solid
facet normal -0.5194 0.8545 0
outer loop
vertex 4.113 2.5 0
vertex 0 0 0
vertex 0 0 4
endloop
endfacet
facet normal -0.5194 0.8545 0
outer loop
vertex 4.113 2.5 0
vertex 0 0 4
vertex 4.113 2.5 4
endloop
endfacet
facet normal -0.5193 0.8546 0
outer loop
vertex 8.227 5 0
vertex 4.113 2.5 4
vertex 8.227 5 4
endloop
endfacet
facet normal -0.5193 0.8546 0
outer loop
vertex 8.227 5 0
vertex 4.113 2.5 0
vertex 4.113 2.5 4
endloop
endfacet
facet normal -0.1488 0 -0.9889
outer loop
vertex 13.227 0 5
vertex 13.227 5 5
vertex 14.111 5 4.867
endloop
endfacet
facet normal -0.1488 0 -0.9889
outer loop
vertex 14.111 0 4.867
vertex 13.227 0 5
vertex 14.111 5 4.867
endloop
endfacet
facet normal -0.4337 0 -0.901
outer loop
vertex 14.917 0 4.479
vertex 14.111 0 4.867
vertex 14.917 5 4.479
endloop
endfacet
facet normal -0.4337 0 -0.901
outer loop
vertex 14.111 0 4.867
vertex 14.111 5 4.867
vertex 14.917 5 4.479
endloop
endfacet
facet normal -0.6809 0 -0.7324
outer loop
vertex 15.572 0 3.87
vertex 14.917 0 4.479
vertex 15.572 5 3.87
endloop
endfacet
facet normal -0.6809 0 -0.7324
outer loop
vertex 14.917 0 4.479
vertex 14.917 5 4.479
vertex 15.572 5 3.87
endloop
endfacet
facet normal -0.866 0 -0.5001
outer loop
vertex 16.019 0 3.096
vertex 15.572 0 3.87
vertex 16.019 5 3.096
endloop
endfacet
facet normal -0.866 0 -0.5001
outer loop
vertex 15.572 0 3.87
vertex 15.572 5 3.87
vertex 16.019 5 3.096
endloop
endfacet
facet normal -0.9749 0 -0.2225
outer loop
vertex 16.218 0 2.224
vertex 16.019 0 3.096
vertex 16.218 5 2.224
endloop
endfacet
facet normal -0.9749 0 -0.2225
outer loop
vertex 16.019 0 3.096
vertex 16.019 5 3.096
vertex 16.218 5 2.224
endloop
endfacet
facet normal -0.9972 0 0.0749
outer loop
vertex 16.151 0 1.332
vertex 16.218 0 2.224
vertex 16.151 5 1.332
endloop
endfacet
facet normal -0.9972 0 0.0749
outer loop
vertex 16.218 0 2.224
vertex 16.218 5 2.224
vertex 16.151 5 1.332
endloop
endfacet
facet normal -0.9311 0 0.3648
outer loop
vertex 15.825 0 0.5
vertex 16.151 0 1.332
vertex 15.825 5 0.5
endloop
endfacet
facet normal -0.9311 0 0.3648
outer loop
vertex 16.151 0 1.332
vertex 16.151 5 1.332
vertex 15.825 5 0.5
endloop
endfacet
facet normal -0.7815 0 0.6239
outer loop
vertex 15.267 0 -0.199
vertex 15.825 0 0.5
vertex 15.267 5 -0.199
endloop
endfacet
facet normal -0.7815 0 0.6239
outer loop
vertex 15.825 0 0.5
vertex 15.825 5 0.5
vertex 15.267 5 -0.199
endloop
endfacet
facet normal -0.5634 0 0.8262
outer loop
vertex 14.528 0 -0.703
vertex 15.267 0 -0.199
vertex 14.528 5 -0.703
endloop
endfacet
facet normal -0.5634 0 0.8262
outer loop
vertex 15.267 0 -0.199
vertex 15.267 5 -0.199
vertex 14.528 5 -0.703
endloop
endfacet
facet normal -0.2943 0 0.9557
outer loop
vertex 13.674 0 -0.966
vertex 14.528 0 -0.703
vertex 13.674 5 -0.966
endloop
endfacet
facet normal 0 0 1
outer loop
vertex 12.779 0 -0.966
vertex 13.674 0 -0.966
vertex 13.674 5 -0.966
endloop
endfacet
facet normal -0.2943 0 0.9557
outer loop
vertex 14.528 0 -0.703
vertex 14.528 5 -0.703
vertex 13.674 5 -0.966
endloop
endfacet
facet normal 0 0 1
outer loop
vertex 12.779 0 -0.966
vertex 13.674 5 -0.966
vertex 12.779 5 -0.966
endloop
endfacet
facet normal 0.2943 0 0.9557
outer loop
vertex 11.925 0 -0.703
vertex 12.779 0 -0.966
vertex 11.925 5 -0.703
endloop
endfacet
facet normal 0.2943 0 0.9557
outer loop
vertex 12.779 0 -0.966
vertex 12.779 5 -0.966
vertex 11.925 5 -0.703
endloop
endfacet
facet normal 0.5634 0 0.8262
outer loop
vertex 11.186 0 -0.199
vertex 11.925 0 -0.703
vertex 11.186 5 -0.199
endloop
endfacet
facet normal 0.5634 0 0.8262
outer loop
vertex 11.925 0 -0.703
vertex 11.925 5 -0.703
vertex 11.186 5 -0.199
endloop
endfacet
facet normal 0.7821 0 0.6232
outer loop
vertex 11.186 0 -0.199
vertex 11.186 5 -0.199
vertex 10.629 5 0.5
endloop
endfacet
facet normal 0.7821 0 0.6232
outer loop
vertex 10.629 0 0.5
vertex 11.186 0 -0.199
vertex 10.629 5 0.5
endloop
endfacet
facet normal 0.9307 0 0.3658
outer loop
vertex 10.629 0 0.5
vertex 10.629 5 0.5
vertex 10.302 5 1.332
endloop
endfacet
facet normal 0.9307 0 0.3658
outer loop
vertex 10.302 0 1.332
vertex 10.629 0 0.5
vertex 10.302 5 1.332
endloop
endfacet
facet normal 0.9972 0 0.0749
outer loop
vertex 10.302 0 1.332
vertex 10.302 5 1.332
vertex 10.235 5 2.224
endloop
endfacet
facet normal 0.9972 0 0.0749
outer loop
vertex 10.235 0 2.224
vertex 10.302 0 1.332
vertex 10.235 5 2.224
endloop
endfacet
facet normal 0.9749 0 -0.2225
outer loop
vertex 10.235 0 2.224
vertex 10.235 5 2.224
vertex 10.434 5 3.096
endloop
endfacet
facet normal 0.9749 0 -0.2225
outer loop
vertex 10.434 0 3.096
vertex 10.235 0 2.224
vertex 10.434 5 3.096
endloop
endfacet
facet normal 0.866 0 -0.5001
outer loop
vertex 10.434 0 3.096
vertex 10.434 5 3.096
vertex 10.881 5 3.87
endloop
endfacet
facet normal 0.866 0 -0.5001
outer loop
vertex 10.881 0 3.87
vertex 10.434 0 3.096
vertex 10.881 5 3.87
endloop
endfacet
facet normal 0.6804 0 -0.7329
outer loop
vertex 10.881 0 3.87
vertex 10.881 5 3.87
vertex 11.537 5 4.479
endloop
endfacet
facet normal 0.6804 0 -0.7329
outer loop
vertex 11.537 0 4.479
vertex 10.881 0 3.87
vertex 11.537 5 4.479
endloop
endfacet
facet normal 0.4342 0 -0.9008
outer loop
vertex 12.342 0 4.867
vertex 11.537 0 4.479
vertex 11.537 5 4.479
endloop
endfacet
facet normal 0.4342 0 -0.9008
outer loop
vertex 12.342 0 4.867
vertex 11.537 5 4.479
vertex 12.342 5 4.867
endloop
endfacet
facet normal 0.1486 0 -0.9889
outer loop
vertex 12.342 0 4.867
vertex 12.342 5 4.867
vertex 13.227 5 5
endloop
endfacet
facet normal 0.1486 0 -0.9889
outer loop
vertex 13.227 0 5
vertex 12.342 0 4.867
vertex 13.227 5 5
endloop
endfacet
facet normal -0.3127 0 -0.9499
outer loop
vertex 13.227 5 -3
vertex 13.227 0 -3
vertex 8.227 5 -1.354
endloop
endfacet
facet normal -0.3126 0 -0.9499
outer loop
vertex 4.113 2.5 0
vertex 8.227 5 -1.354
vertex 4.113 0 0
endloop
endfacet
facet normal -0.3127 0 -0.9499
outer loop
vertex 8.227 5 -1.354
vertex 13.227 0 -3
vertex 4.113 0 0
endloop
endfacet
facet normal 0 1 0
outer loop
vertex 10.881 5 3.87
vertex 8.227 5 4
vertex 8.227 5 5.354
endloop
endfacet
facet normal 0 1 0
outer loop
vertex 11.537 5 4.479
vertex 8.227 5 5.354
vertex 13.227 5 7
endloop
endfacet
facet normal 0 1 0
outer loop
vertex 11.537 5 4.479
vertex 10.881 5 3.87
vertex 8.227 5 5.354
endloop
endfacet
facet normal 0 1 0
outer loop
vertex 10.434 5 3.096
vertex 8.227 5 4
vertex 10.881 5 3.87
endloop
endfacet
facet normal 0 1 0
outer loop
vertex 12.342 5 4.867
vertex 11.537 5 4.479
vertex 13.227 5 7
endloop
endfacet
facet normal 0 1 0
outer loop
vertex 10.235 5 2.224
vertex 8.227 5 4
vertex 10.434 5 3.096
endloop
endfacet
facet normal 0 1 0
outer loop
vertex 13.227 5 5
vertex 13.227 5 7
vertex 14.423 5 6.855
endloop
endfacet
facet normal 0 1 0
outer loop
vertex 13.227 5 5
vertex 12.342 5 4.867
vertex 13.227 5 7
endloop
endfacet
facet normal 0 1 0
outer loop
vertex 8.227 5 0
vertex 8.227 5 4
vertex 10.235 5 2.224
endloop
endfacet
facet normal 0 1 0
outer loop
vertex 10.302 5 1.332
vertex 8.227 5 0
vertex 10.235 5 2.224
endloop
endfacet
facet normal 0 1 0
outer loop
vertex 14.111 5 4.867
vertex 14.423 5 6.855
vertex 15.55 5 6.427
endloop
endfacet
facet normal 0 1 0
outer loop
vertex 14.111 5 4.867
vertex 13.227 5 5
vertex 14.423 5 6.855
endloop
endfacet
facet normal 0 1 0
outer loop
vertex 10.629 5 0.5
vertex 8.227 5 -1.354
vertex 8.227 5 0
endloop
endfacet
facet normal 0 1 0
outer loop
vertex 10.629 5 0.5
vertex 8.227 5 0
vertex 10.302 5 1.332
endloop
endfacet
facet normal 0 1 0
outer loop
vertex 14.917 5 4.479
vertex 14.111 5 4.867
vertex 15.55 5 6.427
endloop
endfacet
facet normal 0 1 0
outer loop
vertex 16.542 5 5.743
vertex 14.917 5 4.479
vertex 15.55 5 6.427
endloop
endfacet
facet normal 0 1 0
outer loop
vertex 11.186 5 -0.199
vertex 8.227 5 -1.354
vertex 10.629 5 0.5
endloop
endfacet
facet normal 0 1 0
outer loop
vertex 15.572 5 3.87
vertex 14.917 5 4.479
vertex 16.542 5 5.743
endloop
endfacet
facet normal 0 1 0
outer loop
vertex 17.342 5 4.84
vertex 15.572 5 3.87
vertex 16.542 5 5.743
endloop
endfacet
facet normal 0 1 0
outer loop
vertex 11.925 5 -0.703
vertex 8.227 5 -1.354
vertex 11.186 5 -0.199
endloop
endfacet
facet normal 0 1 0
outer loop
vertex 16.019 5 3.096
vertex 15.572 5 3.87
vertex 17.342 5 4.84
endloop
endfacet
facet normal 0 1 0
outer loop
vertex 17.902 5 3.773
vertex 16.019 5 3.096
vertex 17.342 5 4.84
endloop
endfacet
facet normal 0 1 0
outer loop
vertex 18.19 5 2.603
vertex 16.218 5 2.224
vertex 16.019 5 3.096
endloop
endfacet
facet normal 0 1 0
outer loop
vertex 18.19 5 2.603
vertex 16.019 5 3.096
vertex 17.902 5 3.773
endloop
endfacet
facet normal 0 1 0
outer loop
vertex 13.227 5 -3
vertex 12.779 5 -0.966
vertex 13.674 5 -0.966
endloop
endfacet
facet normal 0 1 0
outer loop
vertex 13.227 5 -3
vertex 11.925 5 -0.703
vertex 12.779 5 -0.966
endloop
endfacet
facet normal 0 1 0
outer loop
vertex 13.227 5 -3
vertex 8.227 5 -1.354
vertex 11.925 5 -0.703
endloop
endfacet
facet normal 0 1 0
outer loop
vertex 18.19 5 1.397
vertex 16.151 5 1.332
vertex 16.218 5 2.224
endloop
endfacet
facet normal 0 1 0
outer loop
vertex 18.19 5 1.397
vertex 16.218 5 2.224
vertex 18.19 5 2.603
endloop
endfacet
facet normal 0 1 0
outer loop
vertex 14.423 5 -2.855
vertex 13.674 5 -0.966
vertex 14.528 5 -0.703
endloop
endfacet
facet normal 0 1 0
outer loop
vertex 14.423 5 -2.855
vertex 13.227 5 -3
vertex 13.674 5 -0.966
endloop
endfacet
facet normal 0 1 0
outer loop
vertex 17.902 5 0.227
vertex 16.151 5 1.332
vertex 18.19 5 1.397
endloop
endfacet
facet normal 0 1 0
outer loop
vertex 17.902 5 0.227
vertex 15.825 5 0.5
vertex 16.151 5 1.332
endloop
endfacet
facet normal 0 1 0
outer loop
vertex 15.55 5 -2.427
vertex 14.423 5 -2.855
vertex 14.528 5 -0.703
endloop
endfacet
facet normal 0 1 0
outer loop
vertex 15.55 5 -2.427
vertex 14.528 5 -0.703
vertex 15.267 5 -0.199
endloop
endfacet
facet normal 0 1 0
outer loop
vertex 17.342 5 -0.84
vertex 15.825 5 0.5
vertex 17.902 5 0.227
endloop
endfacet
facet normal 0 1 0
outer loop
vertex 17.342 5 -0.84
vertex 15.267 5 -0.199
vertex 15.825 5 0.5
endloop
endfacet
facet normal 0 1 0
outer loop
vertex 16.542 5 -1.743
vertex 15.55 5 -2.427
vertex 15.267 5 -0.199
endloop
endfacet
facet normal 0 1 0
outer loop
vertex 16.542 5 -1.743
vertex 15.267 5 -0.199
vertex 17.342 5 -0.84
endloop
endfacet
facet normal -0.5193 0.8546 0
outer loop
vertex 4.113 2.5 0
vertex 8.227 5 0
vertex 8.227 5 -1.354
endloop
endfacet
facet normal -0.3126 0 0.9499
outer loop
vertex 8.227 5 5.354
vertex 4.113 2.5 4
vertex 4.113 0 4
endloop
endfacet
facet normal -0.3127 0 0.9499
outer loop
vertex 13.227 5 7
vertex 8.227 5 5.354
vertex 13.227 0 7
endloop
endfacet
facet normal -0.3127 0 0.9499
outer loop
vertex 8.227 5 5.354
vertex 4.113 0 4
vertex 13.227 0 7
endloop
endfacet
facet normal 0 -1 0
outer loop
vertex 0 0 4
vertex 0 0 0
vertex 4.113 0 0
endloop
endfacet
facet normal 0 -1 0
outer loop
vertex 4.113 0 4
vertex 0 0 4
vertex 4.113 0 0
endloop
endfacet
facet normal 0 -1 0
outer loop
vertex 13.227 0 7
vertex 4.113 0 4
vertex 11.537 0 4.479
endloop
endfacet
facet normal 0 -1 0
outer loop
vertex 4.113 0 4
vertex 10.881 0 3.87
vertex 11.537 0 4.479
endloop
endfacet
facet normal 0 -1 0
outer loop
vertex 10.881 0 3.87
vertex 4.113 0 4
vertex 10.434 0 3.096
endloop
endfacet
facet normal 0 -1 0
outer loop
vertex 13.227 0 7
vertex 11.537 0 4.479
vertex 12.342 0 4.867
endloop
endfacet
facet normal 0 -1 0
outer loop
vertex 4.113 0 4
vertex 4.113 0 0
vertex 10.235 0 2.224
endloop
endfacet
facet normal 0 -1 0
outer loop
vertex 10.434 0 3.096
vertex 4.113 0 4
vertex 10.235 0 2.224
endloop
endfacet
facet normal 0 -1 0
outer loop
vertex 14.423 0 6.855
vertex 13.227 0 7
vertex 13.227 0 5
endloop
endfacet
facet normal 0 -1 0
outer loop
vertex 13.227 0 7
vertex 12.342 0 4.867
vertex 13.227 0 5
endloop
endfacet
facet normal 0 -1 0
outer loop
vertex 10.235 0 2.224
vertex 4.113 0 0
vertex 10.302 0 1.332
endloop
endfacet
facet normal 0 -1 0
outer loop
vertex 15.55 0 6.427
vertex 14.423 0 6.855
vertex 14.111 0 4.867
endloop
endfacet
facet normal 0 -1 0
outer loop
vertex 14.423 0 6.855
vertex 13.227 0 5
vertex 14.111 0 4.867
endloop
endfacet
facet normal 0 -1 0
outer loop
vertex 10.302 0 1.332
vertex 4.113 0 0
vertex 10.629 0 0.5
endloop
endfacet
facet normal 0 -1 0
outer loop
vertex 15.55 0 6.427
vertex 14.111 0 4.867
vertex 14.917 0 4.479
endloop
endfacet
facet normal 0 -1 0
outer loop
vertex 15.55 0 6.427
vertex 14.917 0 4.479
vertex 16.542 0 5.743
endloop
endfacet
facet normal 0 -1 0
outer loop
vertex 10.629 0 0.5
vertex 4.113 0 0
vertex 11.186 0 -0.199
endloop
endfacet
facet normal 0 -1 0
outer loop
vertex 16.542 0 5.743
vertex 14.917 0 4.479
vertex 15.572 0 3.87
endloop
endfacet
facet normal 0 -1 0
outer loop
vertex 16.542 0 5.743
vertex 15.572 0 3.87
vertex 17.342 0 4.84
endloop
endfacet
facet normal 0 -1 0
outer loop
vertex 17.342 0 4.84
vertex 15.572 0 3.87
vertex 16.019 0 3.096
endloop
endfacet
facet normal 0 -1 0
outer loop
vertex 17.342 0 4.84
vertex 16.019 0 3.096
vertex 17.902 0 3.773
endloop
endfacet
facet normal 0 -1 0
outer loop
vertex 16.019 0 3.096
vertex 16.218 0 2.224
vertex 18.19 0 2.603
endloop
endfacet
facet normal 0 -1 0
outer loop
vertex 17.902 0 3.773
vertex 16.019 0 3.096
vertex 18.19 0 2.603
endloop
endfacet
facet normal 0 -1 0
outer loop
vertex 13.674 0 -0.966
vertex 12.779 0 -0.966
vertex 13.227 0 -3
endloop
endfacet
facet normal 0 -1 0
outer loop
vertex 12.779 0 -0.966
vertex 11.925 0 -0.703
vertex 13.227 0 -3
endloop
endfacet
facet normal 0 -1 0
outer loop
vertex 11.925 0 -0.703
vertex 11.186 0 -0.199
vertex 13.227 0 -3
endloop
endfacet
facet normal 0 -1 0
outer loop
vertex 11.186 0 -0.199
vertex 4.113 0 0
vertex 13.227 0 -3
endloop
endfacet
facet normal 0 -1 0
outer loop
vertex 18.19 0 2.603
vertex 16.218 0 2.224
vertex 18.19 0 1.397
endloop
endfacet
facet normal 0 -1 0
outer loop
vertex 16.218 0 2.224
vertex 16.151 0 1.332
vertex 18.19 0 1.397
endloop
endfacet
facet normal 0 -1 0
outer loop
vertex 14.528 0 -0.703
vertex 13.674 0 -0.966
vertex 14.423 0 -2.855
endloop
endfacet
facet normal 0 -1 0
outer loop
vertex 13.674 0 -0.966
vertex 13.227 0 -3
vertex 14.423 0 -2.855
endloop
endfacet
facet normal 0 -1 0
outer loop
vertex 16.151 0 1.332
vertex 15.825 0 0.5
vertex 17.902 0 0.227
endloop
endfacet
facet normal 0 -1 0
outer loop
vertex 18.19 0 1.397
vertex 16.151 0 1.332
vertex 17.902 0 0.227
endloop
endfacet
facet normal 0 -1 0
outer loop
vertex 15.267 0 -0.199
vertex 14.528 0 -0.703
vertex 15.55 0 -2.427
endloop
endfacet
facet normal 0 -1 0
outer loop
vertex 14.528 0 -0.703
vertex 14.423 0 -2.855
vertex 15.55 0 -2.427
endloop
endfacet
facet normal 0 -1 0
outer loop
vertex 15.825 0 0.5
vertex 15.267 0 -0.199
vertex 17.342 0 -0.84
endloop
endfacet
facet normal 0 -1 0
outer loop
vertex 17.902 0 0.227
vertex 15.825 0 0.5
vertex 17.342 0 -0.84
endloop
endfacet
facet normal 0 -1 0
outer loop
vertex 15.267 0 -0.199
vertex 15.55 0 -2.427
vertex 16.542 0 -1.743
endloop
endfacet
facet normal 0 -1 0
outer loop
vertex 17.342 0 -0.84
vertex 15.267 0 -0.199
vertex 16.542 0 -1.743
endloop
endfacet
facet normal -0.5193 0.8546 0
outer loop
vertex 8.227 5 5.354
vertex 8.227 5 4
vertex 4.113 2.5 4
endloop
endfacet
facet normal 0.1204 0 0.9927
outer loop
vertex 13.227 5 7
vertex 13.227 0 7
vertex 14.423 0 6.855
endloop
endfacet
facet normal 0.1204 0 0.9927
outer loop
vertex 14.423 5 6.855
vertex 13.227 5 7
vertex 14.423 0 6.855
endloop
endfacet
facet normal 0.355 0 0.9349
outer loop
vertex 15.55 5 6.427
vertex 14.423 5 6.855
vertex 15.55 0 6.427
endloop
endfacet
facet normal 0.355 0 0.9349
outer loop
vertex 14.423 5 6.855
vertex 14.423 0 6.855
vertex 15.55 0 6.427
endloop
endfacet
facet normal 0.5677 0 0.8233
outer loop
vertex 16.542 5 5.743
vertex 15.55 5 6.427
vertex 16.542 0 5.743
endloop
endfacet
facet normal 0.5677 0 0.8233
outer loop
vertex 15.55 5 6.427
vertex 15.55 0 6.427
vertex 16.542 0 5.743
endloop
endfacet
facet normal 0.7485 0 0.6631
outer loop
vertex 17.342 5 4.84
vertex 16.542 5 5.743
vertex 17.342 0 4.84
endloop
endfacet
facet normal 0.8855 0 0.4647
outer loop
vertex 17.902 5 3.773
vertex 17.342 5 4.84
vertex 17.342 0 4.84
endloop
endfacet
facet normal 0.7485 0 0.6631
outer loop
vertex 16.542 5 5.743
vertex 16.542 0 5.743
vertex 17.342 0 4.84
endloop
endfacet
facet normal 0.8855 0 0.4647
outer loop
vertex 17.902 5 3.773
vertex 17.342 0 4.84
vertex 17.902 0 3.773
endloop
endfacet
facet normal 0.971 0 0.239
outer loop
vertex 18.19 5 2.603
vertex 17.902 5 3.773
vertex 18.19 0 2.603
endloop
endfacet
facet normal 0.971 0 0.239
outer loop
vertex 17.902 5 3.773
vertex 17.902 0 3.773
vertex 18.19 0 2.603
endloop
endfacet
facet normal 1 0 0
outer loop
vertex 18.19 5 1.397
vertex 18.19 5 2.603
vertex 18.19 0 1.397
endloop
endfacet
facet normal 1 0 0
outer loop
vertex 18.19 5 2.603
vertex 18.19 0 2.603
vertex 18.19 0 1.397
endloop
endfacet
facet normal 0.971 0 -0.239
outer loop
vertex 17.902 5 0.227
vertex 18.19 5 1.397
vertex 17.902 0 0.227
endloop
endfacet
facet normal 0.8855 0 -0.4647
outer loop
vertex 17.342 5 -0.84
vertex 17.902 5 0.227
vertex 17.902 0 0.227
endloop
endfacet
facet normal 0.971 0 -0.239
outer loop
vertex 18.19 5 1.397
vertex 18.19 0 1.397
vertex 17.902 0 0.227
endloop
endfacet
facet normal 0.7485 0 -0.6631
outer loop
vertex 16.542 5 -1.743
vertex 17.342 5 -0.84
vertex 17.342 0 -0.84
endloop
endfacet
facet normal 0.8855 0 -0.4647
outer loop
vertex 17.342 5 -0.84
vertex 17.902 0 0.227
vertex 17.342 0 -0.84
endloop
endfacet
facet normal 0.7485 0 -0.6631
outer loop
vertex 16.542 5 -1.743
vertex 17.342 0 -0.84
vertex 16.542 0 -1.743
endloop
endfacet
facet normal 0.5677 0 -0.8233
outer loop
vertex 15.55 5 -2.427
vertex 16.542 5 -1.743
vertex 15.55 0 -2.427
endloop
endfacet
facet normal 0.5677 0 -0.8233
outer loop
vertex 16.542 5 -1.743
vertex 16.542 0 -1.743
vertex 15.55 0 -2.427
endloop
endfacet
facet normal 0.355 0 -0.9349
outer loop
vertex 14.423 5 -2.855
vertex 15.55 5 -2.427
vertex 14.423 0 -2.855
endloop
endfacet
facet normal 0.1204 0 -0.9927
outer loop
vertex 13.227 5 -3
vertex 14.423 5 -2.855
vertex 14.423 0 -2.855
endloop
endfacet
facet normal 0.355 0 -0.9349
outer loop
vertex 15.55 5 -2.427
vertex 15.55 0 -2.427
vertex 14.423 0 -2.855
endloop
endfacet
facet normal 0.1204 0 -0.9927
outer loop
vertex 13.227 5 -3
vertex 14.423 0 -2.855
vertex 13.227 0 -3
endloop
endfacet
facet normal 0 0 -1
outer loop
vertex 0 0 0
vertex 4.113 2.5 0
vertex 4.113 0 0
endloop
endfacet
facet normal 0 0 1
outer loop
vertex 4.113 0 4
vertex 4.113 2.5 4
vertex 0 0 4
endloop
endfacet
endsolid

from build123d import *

# Parameters (mm, degrees)
BOSS_EXTRUDE4_DEPTH = 4
BOSS_EXTRUDE6_DEPTH = 5
CUT_EXTRUDE1_REACH  = 22.155
CUT_EXTRUDE2_REACH  = 22.155
SKETCH9_R           = 3


with BuildPart() as part:
    # Sketch1 → Boss-Extrude4 (new body)
    with BuildSketch(Plane.XY):
        Polygon((0, 0), (8.226600985, 5), (8.226600985, 0), align=None)
    extrude(amount=BOSS_EXTRUDE4_DEPTH)

    # Sketch7 → Boss-Extrude6 (add)
    with BuildSketch(Plane(origin=(0, 0, 0), x_dir=(1, 0, 0), z_dir=(0, 1, 0))):
        with BuildLine():
            Line((13.226600985, 3), (4.113300493, 0))
            Line((4.113300493, 0), (8.226600985, 0))
            Line((8.226600985, 0), (8.226600985, -4))
            Line((8.226600985, -4), (4.113300493, -4))
            Line((4.113300493, -4), (13.226600985, -7))
            ThreePointArc((13.226600985, -7), (18.226600985, -2), (13.226600985, 3))
        make_face()
    extrude(amount=BOSS_EXTRUDE6_DEPTH)

    # Sketch8 → Cut-Extrude1 (cut, up to next)
    with BuildSketch(Plane.XY, mode=Mode.PRIVATE) as cut_extrude1_sk1:
        Polygon((4.113300493, 2.5), (4.113300493, 5), (8.226600985, 5), align=None)
    cut_extrude1_tool1 = extrude(cut_extrude1_sk1.sketch, amount=-CUT_EXTRUDE1_REACH, mode=Mode.PRIVATE) & part.part
    cut_extrude1 = cut_extrude1_tool1.solids().sort_by_distance((5.484401, 4.166667, 0))[0]
    add(cut_extrude1, mode=Mode.SUBTRACT)

    # Mirror1: Cut-Extrude1 across plane
    add(cut_extrude1.mirror(Plane.XY.offset(2)), mode=Mode.SUBTRACT)

    # Sketch9 → Cut-Extrude2 (cut, up to next)
    with BuildSketch(Plane(origin=(0, 5, 0), x_dir=(1, 0, 0), z_dir=(0, 1, 0)), mode=Mode.PRIVATE) as cut_extrude2_sk1:
        with Locations(Location((13.226600985, -2, 0), (0, 0, 270))):
            Circle(SKETCH9_R)
    cut_extrude2_tool1 = extrude(cut_extrude2_sk1.sketch, amount=-CUT_EXTRUDE2_REACH, mode=Mode.PRIVATE) & part.part
    add(cut_extrude2_tool1.solids().sort_by_distance((13.226601, 5, 2))[0], mode=Mode.SUBTRACT)


solid = part.part
